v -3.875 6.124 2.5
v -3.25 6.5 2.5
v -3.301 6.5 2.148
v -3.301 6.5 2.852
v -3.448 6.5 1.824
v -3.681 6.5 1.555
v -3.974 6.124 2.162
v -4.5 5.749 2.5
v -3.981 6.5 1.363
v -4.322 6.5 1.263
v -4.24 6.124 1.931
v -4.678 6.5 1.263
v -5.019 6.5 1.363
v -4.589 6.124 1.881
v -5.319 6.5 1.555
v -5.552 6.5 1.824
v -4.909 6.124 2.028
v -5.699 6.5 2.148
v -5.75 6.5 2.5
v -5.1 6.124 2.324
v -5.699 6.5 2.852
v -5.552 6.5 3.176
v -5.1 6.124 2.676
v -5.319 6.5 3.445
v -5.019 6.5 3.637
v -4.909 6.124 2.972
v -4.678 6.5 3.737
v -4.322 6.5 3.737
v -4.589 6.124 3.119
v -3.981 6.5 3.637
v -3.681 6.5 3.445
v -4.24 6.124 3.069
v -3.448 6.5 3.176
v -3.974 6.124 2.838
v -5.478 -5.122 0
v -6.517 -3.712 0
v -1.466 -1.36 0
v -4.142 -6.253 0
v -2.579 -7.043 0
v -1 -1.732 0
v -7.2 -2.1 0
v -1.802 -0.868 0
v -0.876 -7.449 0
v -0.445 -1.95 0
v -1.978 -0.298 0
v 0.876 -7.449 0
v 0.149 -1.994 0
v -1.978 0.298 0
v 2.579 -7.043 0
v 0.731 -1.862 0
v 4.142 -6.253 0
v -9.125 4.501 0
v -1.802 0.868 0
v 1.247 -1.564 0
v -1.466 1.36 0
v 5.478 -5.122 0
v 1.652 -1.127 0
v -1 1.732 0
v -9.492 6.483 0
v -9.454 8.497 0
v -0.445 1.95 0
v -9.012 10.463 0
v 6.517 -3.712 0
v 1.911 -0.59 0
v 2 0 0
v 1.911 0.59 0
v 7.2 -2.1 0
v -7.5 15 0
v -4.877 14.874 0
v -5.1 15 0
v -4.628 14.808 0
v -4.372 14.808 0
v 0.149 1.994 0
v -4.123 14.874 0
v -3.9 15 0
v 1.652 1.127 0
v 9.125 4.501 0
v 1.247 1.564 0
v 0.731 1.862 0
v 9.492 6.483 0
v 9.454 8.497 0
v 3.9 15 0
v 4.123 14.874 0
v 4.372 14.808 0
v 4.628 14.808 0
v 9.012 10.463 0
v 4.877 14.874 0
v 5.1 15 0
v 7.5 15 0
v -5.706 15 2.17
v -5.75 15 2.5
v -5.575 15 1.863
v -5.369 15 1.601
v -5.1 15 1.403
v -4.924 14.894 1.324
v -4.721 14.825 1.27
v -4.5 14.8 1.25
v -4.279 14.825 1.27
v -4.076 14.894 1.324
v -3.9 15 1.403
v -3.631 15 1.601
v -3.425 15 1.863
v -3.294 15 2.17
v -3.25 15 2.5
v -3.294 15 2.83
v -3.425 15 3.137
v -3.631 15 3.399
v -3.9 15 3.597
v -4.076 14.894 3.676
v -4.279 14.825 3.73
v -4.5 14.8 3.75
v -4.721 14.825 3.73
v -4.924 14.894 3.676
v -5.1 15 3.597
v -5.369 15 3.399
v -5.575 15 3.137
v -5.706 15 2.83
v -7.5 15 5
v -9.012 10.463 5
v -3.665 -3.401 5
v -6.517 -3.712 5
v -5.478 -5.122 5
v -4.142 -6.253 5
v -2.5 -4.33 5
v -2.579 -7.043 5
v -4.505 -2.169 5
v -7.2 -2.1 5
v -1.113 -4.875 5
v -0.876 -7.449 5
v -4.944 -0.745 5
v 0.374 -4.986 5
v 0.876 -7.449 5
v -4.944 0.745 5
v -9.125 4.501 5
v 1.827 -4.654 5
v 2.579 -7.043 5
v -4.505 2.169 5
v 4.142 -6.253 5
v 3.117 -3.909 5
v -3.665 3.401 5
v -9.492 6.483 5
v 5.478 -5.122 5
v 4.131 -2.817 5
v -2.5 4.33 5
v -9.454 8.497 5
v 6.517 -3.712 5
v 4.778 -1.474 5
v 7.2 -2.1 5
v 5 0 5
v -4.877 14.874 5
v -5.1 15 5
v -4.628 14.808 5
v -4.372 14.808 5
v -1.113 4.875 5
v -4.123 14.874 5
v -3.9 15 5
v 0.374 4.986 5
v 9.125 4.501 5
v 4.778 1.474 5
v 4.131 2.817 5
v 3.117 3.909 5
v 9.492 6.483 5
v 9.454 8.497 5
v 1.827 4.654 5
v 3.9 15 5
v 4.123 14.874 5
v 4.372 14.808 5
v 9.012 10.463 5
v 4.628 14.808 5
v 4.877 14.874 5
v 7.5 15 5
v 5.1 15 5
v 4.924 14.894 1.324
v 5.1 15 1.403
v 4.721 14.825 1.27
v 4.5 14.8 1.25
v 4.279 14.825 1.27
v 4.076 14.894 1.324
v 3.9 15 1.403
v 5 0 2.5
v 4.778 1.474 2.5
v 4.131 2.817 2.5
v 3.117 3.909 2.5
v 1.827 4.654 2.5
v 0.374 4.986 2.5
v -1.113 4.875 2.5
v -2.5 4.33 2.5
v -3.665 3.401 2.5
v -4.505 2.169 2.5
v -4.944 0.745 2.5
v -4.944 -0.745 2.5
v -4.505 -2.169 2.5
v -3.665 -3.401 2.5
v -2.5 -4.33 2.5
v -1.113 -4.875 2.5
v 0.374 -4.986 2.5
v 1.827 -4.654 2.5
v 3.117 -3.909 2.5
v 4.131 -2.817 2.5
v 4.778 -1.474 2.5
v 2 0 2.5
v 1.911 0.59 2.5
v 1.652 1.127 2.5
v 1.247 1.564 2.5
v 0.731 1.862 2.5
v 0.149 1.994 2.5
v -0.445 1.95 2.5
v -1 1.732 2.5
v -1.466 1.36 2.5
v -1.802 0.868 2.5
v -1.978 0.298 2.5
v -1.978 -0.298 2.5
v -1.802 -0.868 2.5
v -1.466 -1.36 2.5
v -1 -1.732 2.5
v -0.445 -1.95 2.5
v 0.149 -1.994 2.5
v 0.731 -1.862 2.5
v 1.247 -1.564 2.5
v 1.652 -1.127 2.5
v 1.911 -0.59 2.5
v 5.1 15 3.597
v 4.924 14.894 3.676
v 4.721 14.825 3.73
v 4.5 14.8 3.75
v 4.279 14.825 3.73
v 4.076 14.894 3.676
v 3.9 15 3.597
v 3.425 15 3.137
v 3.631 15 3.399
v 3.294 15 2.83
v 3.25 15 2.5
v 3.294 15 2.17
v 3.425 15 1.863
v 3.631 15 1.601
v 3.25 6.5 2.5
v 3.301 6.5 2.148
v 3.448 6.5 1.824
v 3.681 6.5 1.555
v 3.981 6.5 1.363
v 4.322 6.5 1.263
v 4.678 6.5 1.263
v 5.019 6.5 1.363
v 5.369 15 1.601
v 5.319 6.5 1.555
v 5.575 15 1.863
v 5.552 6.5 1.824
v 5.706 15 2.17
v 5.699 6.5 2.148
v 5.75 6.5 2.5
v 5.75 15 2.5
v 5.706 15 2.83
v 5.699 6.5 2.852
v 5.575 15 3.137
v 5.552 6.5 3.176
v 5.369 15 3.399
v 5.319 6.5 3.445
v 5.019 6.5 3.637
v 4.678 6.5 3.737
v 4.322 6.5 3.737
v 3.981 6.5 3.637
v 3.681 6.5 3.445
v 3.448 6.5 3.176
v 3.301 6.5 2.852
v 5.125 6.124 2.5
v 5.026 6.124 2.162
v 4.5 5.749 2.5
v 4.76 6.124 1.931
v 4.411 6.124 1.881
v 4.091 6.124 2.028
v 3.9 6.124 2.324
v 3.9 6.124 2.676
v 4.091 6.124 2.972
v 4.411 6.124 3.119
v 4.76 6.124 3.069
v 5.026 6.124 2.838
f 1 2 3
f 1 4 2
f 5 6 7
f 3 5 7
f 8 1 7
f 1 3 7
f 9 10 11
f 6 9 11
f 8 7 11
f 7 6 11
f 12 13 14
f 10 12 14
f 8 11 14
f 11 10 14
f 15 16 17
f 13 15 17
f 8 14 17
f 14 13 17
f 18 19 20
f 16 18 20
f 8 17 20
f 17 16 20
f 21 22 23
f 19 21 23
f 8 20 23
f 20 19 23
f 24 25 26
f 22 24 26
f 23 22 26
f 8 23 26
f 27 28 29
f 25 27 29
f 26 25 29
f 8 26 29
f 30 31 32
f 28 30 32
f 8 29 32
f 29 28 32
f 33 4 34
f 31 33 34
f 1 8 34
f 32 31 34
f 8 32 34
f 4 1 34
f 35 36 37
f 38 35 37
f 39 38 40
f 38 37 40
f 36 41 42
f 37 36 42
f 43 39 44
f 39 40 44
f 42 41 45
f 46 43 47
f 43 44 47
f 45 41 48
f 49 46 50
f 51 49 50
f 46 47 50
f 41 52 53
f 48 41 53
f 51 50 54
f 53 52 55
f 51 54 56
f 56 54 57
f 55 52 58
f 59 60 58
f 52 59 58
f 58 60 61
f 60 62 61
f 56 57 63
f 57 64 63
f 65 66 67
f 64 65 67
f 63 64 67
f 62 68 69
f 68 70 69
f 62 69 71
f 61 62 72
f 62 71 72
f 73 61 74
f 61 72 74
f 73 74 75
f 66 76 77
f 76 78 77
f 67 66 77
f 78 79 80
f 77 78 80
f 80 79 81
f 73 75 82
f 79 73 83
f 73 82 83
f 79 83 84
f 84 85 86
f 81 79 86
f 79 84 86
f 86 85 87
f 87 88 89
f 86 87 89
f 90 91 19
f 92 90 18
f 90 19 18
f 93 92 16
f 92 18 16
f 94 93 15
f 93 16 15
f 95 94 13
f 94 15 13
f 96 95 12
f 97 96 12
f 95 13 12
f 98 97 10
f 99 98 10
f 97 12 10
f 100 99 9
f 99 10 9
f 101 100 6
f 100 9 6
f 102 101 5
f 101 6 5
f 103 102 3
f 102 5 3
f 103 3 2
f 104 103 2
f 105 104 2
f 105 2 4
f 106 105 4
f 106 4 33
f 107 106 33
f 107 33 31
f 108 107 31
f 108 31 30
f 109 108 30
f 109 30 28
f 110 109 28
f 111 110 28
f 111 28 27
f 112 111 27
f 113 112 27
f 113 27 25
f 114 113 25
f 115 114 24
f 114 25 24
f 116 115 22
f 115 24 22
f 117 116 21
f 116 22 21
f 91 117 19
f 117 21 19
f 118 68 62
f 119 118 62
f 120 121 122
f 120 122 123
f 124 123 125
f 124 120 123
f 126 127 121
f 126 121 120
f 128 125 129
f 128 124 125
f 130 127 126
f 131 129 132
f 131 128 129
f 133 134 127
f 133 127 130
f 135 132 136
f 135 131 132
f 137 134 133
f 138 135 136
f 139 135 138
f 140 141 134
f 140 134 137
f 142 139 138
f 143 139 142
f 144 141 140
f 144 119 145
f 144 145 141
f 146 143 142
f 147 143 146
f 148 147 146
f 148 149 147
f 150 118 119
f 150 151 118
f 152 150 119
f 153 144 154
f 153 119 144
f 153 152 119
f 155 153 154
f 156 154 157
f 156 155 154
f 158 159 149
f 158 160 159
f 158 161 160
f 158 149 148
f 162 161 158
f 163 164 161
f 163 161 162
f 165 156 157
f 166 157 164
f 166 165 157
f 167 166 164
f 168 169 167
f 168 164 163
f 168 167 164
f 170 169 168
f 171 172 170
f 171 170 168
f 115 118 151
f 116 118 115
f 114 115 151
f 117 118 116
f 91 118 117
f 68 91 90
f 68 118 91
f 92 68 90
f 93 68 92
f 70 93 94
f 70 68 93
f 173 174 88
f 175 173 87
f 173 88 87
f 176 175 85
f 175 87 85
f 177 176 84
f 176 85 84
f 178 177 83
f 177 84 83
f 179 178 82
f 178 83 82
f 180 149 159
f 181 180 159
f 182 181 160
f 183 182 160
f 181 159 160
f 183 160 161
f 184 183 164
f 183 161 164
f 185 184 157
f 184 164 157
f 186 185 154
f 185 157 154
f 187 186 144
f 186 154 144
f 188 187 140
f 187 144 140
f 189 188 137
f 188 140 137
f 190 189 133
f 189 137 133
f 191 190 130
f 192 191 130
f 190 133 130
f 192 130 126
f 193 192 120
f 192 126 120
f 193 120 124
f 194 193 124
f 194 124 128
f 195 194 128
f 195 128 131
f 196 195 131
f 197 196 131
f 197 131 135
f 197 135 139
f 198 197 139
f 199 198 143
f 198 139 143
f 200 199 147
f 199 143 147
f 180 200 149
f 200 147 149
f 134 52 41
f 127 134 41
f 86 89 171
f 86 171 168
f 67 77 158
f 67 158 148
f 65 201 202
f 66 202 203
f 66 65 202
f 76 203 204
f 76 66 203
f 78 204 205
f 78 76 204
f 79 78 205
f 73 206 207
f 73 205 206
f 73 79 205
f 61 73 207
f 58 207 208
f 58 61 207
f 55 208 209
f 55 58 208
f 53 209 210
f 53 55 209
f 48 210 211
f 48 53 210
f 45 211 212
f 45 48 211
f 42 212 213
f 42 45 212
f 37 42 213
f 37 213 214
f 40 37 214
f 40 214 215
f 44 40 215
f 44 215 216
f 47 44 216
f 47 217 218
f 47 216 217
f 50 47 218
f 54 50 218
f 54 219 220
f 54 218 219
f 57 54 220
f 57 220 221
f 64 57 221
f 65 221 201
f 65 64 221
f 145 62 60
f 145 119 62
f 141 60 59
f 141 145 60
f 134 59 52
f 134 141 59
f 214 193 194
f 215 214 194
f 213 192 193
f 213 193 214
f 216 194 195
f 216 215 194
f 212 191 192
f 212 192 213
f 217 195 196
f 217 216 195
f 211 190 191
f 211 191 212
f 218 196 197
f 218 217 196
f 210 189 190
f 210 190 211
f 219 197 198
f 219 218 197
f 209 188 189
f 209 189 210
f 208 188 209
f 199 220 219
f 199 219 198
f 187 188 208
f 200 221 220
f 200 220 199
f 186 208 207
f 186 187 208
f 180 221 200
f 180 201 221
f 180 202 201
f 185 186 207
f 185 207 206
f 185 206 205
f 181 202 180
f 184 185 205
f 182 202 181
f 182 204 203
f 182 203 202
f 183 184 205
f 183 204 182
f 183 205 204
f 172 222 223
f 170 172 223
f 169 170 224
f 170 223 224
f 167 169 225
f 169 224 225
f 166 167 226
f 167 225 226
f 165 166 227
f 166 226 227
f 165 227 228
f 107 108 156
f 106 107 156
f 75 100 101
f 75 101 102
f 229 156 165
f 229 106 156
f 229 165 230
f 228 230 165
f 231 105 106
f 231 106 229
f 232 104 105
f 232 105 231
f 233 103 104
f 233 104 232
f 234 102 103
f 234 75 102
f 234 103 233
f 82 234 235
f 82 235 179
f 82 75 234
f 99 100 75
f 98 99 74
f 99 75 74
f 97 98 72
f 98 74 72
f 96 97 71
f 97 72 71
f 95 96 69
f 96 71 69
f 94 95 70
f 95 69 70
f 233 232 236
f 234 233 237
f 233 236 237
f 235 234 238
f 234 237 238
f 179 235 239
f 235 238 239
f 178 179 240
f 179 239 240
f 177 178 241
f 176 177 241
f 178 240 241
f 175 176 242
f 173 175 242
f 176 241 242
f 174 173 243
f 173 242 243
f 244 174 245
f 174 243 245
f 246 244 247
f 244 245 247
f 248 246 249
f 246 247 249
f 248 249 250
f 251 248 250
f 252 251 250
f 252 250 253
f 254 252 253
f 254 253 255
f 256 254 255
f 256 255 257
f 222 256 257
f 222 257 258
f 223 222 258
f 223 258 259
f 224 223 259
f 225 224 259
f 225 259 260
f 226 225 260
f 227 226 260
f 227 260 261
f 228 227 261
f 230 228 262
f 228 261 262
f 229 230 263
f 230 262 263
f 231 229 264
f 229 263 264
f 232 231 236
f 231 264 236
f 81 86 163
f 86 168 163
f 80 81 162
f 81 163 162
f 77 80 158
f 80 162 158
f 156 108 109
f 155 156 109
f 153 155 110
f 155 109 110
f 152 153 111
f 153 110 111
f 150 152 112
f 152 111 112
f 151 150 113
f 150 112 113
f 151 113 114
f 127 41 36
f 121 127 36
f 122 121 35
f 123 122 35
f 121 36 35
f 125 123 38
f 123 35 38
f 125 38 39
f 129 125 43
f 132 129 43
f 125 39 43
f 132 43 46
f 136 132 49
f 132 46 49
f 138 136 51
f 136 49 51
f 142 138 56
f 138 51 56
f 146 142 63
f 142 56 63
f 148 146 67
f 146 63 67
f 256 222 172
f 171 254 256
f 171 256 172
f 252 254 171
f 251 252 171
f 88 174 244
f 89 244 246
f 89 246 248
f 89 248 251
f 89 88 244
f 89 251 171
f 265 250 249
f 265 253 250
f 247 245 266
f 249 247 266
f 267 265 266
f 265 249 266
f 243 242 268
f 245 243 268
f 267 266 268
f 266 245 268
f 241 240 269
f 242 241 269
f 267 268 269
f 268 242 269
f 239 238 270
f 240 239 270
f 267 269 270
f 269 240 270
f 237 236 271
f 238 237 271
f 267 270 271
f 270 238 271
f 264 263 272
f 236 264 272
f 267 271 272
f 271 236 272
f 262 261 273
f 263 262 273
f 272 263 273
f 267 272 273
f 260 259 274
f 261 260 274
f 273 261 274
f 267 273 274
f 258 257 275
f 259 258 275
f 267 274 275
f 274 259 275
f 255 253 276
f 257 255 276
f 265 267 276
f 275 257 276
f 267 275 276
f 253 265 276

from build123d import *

# Parameters (mm, degrees)
SKETCH_1_R             = 7.5
SKETCH_1_R_2           = 2
EXTRUDE_1_DEPTH        = 5
EXTRUDE_START          = -5
EXTRUDE_2_DEPTH        = 5
SKETCH_3_R             = 1
CUT_EXTRUDE_1_DEPTH    = 5
EXTRUDE_3_DEPTH        = 5
FILLET_1_R             = 10
SKETCH_11_R            = 5
CUT_EXTRUDE_4_DEPTH    = 2.5
SKETCH_12_R            = 1
CUT_EXTRUDE_5_DEPTH    = 19.45893317
HOLE_WIZARD_M3_1_D     = 2.5
HOLE_WIZARD_M3_1_DEPTH = 8.5
HOLE_WIZARD_M3_1_TIP   = 0.751075774


with BuildPart() as part:
    # ｽｹｯﾁ1 → ﾎﾞｽ - 押し出し1 (new body)
    with BuildSketch(Plane.XY):
        Circle(SKETCH_1_R)
        Circle(SKETCH_1_R_2, mode=Mode.SUBTRACT)
    extrude(amount=EXTRUDE_1_DEPTH)

    # ｽｹｯﾁ2 → ﾎﾞｽ - 押し出し2 (add)
    with BuildSketch(Plane.XY.offset(5).offset(EXTRUDE_START)):
        with BuildLine():
            Line((-7.5, 0), (-7.5, 15))
            Line((-7.5, 15), (7.5, 15))
            Line((7.5, 15), (7.5, 0))
            ThreePointArc((7.5, 0), (0, 7.5), (-7.5, 0))
        make_face()
    extrude(amount=EXTRUDE_2_DEPTH)

    # ｽｹｯﾁ3 → ｶｯﾄ - 押し出し1 (cut)
    with BuildSketch(Plane(origin=(0, 15, 0), x_dir=(1, 0, 0), z_dir=(0, 1, 0))):
        with Locations(Location((-4.5, -2.5, 0), (0, 0, 270))):
            Circle(SKETCH_3_R)
        with Locations(Location((4.5, -2.5, 0), (0, 0, 90))):
            Circle(SKETCH_3_R)
    extrude(amount=-CUT_EXTRUDE_1_DEPTH, mode=Mode.SUBTRACT)

    # ｽｹｯﾁ4 → ﾎﾞｽ - 押し出し3 (add)
    with BuildSketch(Plane.XY.offset(5).offset(EXTRUDE_START)):
        with BuildLine():
            Line((-7.5, 15), (-10, 7.5))
            Line((-10, 7.5), (-7.2, -2.1))
            ThreePointArc((-7.2, -2.1), (-7.424621202, -1.060660172), (-7.5, 0))
            Line((-7.5, 0), (-7.5, 15))
        make_face()
        with BuildLine():
            Line((7.5, 0), (7.5, 15))
            Line((7.5, 15), (10, 7.5))
            Line((10, 7.5), (7.2, -2.1))
            ThreePointArc((7.2, -2.1), (7.424621202, -1.060660172), (7.5, 0))
        make_face()
    extrude(amount=EXTRUDE_3_DEPTH)

    # ﾌｨﾚｯﾄ1
    fillet_1_edges = [part.edges().sort_by_distance(p)[0] for p in [
        (-10, 7.5, 2.5),
        (10, 7.5, 2.5),
    ]]
    fillet(fillet_1_edges, radius=FILLET_1_R)

    # ｽｹｯﾁ11 → ｶｯﾄ - 押し出し4 (cut)
    with BuildSketch(Plane.XY.offset(5)):
        Circle(SKETCH_11_R)
    extrude(amount=-CUT_EXTRUDE_4_DEPTH, mode=Mode.SUBTRACT)

    # ｽｹｯﾁ12 → ｶｯﾄ - 押し出し5 (cut, through all)
    with BuildSketch(Plane(origin=(0, 0, 0), x_dir=(-1, 0, 0), z_dir=(0, 0, -1))):
        with Locations((-4.5, 15.8)):
            Circle(SKETCH_12_R)
        with Locations((4.5, 15.8)):
            Circle(SKETCH_12_R)
    extrude(amount=-CUT_EXTRUDE_5_DEPTH, mode=Mode.SUBTRACT)

    # M3 ねじ穴1
    with Locations(Plane(origin=(0, 15, 0), x_dir=(1, 0, 0), z_dir=(0, 1, 0))):
        with Locations((-4.5, -2.5), (4.5, -2.5)):
            Hole(HOLE_WIZARD_M3_1_D / 2, depth=HOLE_WIZARD_M3_1_DEPTH)
            with Locations((0, 0, -(HOLE_WIZARD_M3_1_DEPTH + HOLE_WIZARD_M3_1_TIP / 2))):  # 118° drill point
                Cone(0, HOLE_WIZARD_M3_1_D / 2, HOLE_WIZARD_M3_1_TIP, mode=Mode.SUBTRACT)


solid = part.part
